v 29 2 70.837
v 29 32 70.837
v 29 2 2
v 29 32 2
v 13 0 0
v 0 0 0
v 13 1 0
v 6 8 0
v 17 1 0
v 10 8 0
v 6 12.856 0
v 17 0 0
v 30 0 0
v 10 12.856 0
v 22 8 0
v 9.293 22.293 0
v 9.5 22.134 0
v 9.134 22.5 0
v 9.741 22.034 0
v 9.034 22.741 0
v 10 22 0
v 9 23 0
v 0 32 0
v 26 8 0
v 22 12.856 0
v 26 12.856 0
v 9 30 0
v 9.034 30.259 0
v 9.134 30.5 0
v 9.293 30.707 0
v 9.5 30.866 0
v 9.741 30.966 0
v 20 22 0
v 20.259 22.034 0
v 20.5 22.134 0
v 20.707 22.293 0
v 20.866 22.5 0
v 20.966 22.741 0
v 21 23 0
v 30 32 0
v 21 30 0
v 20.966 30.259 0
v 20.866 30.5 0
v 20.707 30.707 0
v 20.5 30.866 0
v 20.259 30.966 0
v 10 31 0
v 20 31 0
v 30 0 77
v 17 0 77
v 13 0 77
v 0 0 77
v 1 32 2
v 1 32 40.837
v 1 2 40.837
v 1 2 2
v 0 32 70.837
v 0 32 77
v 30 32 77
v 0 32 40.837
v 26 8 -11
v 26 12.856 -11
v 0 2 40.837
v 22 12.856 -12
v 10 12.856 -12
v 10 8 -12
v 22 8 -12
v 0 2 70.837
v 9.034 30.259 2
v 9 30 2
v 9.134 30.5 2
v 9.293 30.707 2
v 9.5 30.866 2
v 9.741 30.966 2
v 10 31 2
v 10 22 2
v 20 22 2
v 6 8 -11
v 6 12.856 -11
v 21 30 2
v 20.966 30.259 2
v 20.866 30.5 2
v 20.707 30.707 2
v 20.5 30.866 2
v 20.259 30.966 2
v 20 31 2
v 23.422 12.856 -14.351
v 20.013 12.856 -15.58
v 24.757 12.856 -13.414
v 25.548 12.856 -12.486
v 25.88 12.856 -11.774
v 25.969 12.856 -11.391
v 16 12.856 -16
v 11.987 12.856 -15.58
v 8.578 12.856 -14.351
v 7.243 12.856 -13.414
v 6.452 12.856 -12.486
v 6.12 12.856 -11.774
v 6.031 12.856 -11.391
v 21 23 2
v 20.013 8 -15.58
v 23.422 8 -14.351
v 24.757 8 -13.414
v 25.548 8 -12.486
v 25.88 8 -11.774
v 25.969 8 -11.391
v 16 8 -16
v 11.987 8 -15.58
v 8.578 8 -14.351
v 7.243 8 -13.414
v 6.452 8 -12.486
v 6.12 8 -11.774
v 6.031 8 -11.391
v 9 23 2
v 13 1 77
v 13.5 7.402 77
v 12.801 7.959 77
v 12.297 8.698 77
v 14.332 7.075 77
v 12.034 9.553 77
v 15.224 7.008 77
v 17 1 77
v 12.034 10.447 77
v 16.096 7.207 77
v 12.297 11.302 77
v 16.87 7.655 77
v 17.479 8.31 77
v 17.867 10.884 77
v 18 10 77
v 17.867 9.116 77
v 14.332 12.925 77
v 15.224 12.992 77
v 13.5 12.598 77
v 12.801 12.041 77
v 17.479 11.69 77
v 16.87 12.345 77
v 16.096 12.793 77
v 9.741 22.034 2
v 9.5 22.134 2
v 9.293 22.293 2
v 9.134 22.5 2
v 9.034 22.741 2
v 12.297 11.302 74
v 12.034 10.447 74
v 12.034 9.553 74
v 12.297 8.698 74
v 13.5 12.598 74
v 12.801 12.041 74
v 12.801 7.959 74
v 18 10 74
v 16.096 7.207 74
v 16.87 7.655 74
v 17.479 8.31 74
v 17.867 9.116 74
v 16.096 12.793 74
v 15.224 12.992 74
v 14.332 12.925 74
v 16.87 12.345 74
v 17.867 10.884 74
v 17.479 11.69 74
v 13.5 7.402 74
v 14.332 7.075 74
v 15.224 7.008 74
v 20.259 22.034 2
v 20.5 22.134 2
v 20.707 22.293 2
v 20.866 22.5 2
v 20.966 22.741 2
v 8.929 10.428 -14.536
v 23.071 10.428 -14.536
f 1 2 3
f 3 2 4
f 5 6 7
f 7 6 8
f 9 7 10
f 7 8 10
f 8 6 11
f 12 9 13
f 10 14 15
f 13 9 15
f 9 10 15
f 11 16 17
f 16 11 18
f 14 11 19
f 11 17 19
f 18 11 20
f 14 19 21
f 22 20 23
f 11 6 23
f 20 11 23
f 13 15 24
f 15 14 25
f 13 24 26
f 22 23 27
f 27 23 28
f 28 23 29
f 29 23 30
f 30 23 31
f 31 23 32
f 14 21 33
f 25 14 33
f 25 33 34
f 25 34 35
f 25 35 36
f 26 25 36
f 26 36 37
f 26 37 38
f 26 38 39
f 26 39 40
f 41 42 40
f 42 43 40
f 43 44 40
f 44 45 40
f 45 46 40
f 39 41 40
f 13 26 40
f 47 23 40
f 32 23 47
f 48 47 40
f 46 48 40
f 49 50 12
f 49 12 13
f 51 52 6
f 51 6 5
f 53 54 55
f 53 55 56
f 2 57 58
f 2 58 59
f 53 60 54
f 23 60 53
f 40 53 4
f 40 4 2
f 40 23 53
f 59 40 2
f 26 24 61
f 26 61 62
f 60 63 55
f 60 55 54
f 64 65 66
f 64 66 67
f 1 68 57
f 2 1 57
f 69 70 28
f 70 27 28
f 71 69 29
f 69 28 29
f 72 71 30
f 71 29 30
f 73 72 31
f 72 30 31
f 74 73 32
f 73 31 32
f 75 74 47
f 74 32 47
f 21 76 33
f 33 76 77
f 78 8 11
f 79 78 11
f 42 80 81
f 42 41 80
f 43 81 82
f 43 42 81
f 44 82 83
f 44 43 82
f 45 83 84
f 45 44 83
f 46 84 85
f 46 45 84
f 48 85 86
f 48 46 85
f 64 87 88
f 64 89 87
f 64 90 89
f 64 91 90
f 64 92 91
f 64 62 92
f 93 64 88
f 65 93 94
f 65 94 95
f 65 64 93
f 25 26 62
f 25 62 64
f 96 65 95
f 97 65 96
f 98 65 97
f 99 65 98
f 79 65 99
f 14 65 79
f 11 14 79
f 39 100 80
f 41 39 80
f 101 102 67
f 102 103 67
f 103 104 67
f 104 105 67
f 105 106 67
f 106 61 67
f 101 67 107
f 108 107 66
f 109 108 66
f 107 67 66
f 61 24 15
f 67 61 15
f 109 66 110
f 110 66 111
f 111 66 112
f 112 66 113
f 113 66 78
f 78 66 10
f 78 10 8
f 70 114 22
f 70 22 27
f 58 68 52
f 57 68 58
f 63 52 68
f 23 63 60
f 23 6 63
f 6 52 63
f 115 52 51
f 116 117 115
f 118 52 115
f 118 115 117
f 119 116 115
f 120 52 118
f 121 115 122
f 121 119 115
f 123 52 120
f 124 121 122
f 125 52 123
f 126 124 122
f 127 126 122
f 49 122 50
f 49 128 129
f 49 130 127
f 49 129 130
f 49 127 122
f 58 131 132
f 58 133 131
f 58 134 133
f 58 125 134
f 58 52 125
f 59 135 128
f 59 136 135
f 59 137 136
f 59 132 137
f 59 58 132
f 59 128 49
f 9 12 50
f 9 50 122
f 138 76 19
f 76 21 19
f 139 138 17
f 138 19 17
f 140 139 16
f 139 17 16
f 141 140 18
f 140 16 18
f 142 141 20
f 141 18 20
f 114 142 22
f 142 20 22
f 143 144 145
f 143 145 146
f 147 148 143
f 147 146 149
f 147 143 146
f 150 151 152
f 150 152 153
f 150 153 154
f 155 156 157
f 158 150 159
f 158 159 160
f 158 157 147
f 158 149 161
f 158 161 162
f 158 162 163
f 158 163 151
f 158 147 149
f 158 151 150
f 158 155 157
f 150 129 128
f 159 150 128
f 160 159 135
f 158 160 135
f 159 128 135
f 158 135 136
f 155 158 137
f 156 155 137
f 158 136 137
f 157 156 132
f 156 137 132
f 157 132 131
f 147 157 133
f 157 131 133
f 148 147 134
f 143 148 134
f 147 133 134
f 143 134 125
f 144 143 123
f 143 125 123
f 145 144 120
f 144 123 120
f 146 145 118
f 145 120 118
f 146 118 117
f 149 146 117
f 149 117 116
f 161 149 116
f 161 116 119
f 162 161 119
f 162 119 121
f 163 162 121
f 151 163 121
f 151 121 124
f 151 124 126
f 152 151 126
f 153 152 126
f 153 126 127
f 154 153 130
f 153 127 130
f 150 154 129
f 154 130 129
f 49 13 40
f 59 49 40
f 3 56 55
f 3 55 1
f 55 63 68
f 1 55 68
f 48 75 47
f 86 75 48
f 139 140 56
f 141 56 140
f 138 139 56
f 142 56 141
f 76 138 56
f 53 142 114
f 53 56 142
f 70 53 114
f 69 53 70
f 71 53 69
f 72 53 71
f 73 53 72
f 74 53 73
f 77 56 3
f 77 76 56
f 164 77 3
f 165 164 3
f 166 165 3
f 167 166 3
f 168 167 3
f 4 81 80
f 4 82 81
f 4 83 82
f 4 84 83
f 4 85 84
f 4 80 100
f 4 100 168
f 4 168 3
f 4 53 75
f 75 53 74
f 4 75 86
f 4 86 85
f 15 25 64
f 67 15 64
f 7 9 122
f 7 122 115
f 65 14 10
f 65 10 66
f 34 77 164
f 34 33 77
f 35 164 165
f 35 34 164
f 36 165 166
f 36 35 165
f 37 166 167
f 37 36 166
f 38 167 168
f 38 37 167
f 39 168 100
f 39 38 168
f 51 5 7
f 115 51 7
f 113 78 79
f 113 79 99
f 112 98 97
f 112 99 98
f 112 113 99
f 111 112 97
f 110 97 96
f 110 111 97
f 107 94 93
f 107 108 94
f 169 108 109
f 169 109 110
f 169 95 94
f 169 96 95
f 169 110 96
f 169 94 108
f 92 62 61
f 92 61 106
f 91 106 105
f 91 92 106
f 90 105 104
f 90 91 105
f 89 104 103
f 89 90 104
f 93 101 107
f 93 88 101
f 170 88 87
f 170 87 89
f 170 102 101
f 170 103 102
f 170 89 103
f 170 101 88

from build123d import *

# Parameters (mm, degrees)
ESQUISSE1_W              = 30
ESQUISSE1_H              = 32
BOSS_EXTRU_2_DEPTH       = 77
ESQUISSE2_W              = 28
ESQUISSE2_H              = 68.8370016
ENL_V_MAT_EXTRU_4_DEPTH  = 30
ESQUISSE3_W              = 12
ESQUISSE3_H              = 9
ENL_V_MAT_EXTRU_5_DEPTH  = 87.884981441
ESQUISSE5_W              = 20
ESQUISSE5_H              = 4.856303455
BOSS_EXTRU_3_DEPTH       = 16
ESQUISSE6_W              = 12
ESQUISSE6_H              = 12
ENL_V_MAT_EXTRU_6_DEPTH  = 6
ESQUISSE7_W              = 30
ESQUISSE7_H              = 30
ENL_V_MAT_EXTRU_7_DEPTH  = 6
CONG_3_SIZE              = 5
CONG_3_SIZE_2            = 10
CONG_5_SIZE              = 5
CONG_5_SIZE_2            = 10
ESQUISSE10_W             = 4
ESQUISSE10_H             = 1
ENL_V_MAT_EXTRU_9_DEPTH  = 89.617154096
ESQUISSE16_R             = 3
ENL_V_MAT_EXTRU_11_DEPTH = 3
CONG_7_R                 = 1


with BuildPart() as part:
    # Esquisse1 → Boss.-Extru.2 (new body)
    with BuildSketch(Plane.XY):
        with Locations((15, 16)):
            Rectangle(ESQUISSE1_W, ESQUISSE1_H)
    extrude(amount=BOSS_EXTRU_2_DEPTH)

    # Esquisse2 → Enlèv. mat.-Extru.4 (cut)
    with BuildSketch(Plane(origin=(0, 32, 0), x_dir=(1, 0, 0), z_dir=(0, 1, 0))):
        with Locations((15, -36.4185008)):
            Rectangle(ESQUISSE2_W, ESQUISSE2_H)
    extrude(amount=-ENL_V_MAT_EXTRU_4_DEPTH, mode=Mode.SUBTRACT)

    # Esquisse3 → Enlèv. mat.-Extru.5 (cut, through all)
    with BuildSketch(Plane.XY.offset(2)):
        with Locations((15, 26.5)):
            Rectangle(ESQUISSE3_W, ESQUISSE3_H)
    extrude(amount=-ENL_V_MAT_EXTRU_5_DEPTH, mode=Mode.SUBTRACT)

    # Esquisse5 → Boss.-Extru.3 (add)
    with BuildSketch(Plane(origin=(0, 0, 0), x_dir=(-1, 0, 0), z_dir=(0, 0, -1))):
        with Locations((-16, 10.428151728)):
            Rectangle(ESQUISSE5_W, ESQUISSE5_H)
    extrude(amount=BOSS_EXTRU_3_DEPTH)

    # Esquisse6 → Enlèv. mat.-Extru.6 (cut)
    with BuildSketch(Plane(origin=(0, 12.856303455, 0), x_dir=(1, 0, 0), z_dir=(0, 1, 0))):
        with Locations((16, 6)):
            Rectangle(ESQUISSE6_W, ESQUISSE6_H)
    extrude(amount=-ENL_V_MAT_EXTRU_6_DEPTH, mode=Mode.SUBTRACT)

    # Esquisse7 → Enlèv. mat.-Extru.7 (cut)
    with BuildSketch(Plane.ZY):
        with Locations((55.8370016, 17)):
            Rectangle(ESQUISSE7_W, ESQUISSE7_H)
    extrude(amount=-ENL_V_MAT_EXTRU_7_DEPTH, mode=Mode.SUBTRACT)

    # Congé3
    # a fillet whose section is not a circle: 10, 5 mm, written as the material it takes off along each edge
    with BuildSketch(Plane(origin=(6, -17, -16), x_dir=(0, 0, 1), z_dir=(0, 1, 0))) as cong_3_piece_1:
        with BuildLine():
            Bezier((CONG_3_SIZE, 0), (0, 0), (0, CONG_3_SIZE_2), weights=[1, 0.707106781, 1])
            Line((0, CONG_3_SIZE_2), (0, 0))
            Line((0, 0), (CONG_3_SIZE, 0))
        make_face()
    extrude(amount=54.856303455, mode=Mode.SUBTRACT)

    # Congé5
    # a fillet whose section is not a circle: 10, 5 mm, written as the material it takes off along each edge
    with BuildSketch(Plane(origin=(26, 37.856303455, -16), x_dir=(0, 0, 1), z_dir=(0, -1, 0))) as cong_5_piece_1:
        with BuildLine():
            Bezier((CONG_5_SIZE, 0), (0, 0), (0, CONG_5_SIZE_2), weights=[1, 0.707106781, 1])
            Line((0, CONG_5_SIZE_2), (0, 0))
            Line((0, 0), (CONG_5_SIZE, 0))
        make_face()
    extrude(amount=54.856303455, mode=Mode.SUBTRACT)

    # Esquisse10 → Enlèv. mat.-Extru.9 (cut, through all)
    with BuildSketch(Plane(origin=(0, 0, 0), x_dir=(-1, 0, 0), z_dir=(0, 0, -1))):
        with Locations((-15, 0.5)):
            Rectangle(ESQUISSE10_W, ESQUISSE10_H)
    extrude(amount=-ENL_V_MAT_EXTRU_9_DEPTH, mode=Mode.SUBTRACT)

    # Esquisse16 → Enlèv. mat.-Extru.11 (cut)
    with BuildSketch(Plane.XY.offset(77)):
        with Locations((15, 10)):
            Circle(ESQUISSE16_R)
    extrude(amount=-ENL_V_MAT_EXTRU_11_DEPTH, mode=Mode.SUBTRACT)

    # Congé7
    cong_7_edges = [part.edges().sort_by_distance(p)[0] for p in [
        (21, 31, 1),
        (21, 22, 1),
        (9, 22, 1),
        (9, 31, 1),
    ]]
    fillet(cong_7_edges, radius=CONG_7_R)


solid = part.part
